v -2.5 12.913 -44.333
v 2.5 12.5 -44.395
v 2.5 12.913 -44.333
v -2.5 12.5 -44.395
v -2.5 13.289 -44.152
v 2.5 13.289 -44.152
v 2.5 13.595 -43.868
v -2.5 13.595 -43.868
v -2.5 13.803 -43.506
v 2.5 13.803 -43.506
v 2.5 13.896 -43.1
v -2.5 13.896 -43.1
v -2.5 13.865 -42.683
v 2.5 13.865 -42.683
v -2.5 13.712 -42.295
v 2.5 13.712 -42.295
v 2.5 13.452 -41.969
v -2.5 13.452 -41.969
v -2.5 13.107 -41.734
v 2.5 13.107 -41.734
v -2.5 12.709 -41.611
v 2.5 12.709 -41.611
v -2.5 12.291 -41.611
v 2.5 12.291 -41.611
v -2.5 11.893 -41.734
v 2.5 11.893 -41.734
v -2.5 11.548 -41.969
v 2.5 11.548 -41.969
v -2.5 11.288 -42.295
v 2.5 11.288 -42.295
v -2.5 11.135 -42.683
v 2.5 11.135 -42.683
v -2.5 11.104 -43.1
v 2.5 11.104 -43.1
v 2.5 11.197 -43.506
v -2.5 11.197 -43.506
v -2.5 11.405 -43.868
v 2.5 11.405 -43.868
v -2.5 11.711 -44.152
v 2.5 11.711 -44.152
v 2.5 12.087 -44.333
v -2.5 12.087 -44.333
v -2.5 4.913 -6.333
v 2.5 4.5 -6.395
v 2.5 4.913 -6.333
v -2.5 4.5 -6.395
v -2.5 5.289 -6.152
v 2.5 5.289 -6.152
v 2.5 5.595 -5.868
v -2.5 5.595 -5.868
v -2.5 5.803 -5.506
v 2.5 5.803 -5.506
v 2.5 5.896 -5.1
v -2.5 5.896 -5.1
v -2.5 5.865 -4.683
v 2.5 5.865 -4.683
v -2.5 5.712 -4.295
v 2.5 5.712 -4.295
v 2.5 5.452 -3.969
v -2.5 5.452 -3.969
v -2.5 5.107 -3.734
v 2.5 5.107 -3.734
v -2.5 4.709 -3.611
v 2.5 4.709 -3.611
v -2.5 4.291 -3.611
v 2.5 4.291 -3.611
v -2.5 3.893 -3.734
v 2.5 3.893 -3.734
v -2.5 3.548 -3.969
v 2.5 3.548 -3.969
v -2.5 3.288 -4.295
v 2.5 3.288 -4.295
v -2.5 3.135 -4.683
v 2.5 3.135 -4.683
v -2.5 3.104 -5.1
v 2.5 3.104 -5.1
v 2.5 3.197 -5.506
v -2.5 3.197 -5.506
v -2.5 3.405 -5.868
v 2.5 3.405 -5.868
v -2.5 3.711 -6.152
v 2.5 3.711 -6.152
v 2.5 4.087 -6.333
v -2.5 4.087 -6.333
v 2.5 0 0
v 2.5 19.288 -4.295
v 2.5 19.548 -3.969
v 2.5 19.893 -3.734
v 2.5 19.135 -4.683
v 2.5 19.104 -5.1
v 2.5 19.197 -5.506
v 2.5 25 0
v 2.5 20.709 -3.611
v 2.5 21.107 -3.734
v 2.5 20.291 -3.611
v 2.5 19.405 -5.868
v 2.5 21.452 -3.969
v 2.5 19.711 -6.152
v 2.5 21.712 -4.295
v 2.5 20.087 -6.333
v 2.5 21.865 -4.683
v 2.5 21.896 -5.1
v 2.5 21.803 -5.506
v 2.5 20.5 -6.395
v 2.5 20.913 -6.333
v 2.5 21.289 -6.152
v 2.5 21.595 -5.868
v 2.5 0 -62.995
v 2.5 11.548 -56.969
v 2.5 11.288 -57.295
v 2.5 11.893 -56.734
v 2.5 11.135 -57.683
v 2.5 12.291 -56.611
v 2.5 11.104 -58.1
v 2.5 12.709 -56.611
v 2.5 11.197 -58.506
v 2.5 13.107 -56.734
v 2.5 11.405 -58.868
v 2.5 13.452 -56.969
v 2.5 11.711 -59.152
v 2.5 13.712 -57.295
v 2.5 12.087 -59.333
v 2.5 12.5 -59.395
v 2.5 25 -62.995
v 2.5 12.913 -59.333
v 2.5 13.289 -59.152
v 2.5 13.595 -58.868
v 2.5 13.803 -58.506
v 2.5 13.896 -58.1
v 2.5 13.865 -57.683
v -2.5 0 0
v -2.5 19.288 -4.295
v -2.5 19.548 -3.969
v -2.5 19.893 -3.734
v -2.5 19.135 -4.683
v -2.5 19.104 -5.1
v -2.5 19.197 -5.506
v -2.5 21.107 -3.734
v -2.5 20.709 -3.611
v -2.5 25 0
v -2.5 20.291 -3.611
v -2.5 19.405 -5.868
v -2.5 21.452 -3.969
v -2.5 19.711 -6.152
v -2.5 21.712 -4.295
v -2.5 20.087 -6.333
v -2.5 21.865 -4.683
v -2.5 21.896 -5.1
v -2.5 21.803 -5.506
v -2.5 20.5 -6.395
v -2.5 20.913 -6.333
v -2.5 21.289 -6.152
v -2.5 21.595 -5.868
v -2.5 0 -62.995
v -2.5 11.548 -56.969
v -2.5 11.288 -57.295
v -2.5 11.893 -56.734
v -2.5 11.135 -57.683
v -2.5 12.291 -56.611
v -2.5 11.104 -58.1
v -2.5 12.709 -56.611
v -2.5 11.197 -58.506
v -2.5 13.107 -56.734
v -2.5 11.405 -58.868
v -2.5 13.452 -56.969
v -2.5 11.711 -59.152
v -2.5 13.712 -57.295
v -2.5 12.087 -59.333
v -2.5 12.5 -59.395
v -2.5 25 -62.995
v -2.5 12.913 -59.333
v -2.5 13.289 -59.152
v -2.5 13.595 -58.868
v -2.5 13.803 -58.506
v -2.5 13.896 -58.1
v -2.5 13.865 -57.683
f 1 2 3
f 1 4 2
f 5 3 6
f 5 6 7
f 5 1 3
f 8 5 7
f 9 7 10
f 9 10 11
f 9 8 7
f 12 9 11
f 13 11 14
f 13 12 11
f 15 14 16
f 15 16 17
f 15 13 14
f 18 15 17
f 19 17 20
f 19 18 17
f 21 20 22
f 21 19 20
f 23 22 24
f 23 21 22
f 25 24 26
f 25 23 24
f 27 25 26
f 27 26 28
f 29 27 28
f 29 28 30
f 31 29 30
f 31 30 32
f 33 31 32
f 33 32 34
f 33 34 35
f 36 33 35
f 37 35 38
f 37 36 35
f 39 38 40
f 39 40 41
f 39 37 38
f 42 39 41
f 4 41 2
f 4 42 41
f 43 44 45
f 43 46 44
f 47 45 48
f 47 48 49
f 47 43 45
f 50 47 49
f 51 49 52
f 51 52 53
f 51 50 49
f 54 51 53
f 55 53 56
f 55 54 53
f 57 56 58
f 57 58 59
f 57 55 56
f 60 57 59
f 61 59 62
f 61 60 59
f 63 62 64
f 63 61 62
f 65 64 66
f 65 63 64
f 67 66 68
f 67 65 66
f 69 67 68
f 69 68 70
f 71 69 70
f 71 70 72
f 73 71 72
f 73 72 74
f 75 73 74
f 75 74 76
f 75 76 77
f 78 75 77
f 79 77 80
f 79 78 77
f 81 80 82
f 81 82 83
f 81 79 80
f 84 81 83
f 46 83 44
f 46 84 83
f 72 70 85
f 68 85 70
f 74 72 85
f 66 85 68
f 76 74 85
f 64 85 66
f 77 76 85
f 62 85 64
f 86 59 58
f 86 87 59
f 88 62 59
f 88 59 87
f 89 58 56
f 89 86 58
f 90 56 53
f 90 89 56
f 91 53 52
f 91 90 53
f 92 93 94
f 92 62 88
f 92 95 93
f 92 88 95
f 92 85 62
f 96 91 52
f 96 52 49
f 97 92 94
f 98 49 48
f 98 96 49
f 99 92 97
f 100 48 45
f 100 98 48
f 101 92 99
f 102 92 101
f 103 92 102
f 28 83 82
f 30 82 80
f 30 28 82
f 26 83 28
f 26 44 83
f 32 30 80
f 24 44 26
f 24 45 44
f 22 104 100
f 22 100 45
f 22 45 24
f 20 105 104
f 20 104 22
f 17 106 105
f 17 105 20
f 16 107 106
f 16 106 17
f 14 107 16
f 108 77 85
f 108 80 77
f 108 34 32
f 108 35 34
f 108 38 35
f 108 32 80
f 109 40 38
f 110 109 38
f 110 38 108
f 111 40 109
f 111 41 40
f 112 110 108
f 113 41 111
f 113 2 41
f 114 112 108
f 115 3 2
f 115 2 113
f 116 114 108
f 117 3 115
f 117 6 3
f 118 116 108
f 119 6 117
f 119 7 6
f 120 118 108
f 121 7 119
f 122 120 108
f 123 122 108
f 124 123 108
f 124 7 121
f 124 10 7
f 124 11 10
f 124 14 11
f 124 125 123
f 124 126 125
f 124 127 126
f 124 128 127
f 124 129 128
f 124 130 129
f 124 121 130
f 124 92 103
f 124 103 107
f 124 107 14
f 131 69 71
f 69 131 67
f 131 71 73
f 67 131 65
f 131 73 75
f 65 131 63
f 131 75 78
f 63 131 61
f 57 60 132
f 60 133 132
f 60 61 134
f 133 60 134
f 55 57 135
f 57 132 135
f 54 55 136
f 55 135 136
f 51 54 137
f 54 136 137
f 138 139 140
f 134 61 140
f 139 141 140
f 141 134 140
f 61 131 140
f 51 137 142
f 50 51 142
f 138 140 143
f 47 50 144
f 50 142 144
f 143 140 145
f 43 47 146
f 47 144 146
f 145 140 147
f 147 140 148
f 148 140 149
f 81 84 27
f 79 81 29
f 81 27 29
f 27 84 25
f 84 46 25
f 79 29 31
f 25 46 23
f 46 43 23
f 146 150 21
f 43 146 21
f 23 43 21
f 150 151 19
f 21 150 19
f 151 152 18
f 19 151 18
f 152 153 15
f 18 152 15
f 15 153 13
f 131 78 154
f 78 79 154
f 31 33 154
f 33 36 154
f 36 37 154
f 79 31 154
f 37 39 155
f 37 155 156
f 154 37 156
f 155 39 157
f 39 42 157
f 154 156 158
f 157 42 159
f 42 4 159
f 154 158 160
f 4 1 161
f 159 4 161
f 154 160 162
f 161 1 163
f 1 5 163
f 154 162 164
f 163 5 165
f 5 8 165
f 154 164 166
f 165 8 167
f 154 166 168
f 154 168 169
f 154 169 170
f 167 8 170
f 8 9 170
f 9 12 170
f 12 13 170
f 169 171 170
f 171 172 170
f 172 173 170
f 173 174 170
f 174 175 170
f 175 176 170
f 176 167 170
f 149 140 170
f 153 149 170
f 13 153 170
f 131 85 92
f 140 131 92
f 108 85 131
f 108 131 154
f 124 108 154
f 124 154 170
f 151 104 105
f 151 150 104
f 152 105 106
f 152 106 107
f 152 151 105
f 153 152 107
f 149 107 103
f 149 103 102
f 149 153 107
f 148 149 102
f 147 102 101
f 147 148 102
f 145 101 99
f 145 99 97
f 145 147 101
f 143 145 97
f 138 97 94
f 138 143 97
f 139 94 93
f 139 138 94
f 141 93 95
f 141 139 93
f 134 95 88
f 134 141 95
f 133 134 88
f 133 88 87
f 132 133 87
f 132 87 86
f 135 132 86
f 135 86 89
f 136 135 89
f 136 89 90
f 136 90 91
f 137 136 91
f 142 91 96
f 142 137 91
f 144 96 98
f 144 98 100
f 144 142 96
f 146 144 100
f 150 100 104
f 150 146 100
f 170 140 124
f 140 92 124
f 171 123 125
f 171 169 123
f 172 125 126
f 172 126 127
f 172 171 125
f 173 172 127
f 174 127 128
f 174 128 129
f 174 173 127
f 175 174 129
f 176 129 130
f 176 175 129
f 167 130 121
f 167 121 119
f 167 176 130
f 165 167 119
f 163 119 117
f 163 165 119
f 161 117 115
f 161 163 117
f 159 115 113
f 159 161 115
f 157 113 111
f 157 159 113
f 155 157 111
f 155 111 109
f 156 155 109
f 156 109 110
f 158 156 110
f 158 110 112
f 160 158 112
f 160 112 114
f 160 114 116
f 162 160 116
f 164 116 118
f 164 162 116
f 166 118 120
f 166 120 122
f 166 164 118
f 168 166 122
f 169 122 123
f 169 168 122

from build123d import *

# Parameters (mm, degrees)
SKETCH_1_W      = 62.995
SKETCH_1_H      = 25
SKETCH_1_R      = 1.4
EXTRUDE_1_DEPTH = 2.5


with BuildPart() as part:
    # 草图1 → 凸台-拉伸1 (new body, symmetric)
    with BuildSketch(Plane(origin=(0, 0, 0), x_dir=(0, 0, -1), z_dir=(1, 0, 0))):
        with Locations((31.4975, 12.5)):
            Rectangle(SKETCH_1_W, SKETCH_1_H)
        with Locations((4.995, 4.5)):
            Circle(SKETCH_1_R, mode=Mode.SUBTRACT)
        with Locations((4.995, 20.5)):
            Circle(SKETCH_1_R, mode=Mode.SUBTRACT)
        with Locations((42.995, 12.5)):
            Circle(SKETCH_1_R, mode=Mode.SUBTRACT)
        with Locations((57.995, 12.5)):
            Circle(SKETCH_1_R, mode=Mode.SUBTRACT)
    extrude(amount=EXTRUDE_1_DEPTH, both=True)


solid = part.part
